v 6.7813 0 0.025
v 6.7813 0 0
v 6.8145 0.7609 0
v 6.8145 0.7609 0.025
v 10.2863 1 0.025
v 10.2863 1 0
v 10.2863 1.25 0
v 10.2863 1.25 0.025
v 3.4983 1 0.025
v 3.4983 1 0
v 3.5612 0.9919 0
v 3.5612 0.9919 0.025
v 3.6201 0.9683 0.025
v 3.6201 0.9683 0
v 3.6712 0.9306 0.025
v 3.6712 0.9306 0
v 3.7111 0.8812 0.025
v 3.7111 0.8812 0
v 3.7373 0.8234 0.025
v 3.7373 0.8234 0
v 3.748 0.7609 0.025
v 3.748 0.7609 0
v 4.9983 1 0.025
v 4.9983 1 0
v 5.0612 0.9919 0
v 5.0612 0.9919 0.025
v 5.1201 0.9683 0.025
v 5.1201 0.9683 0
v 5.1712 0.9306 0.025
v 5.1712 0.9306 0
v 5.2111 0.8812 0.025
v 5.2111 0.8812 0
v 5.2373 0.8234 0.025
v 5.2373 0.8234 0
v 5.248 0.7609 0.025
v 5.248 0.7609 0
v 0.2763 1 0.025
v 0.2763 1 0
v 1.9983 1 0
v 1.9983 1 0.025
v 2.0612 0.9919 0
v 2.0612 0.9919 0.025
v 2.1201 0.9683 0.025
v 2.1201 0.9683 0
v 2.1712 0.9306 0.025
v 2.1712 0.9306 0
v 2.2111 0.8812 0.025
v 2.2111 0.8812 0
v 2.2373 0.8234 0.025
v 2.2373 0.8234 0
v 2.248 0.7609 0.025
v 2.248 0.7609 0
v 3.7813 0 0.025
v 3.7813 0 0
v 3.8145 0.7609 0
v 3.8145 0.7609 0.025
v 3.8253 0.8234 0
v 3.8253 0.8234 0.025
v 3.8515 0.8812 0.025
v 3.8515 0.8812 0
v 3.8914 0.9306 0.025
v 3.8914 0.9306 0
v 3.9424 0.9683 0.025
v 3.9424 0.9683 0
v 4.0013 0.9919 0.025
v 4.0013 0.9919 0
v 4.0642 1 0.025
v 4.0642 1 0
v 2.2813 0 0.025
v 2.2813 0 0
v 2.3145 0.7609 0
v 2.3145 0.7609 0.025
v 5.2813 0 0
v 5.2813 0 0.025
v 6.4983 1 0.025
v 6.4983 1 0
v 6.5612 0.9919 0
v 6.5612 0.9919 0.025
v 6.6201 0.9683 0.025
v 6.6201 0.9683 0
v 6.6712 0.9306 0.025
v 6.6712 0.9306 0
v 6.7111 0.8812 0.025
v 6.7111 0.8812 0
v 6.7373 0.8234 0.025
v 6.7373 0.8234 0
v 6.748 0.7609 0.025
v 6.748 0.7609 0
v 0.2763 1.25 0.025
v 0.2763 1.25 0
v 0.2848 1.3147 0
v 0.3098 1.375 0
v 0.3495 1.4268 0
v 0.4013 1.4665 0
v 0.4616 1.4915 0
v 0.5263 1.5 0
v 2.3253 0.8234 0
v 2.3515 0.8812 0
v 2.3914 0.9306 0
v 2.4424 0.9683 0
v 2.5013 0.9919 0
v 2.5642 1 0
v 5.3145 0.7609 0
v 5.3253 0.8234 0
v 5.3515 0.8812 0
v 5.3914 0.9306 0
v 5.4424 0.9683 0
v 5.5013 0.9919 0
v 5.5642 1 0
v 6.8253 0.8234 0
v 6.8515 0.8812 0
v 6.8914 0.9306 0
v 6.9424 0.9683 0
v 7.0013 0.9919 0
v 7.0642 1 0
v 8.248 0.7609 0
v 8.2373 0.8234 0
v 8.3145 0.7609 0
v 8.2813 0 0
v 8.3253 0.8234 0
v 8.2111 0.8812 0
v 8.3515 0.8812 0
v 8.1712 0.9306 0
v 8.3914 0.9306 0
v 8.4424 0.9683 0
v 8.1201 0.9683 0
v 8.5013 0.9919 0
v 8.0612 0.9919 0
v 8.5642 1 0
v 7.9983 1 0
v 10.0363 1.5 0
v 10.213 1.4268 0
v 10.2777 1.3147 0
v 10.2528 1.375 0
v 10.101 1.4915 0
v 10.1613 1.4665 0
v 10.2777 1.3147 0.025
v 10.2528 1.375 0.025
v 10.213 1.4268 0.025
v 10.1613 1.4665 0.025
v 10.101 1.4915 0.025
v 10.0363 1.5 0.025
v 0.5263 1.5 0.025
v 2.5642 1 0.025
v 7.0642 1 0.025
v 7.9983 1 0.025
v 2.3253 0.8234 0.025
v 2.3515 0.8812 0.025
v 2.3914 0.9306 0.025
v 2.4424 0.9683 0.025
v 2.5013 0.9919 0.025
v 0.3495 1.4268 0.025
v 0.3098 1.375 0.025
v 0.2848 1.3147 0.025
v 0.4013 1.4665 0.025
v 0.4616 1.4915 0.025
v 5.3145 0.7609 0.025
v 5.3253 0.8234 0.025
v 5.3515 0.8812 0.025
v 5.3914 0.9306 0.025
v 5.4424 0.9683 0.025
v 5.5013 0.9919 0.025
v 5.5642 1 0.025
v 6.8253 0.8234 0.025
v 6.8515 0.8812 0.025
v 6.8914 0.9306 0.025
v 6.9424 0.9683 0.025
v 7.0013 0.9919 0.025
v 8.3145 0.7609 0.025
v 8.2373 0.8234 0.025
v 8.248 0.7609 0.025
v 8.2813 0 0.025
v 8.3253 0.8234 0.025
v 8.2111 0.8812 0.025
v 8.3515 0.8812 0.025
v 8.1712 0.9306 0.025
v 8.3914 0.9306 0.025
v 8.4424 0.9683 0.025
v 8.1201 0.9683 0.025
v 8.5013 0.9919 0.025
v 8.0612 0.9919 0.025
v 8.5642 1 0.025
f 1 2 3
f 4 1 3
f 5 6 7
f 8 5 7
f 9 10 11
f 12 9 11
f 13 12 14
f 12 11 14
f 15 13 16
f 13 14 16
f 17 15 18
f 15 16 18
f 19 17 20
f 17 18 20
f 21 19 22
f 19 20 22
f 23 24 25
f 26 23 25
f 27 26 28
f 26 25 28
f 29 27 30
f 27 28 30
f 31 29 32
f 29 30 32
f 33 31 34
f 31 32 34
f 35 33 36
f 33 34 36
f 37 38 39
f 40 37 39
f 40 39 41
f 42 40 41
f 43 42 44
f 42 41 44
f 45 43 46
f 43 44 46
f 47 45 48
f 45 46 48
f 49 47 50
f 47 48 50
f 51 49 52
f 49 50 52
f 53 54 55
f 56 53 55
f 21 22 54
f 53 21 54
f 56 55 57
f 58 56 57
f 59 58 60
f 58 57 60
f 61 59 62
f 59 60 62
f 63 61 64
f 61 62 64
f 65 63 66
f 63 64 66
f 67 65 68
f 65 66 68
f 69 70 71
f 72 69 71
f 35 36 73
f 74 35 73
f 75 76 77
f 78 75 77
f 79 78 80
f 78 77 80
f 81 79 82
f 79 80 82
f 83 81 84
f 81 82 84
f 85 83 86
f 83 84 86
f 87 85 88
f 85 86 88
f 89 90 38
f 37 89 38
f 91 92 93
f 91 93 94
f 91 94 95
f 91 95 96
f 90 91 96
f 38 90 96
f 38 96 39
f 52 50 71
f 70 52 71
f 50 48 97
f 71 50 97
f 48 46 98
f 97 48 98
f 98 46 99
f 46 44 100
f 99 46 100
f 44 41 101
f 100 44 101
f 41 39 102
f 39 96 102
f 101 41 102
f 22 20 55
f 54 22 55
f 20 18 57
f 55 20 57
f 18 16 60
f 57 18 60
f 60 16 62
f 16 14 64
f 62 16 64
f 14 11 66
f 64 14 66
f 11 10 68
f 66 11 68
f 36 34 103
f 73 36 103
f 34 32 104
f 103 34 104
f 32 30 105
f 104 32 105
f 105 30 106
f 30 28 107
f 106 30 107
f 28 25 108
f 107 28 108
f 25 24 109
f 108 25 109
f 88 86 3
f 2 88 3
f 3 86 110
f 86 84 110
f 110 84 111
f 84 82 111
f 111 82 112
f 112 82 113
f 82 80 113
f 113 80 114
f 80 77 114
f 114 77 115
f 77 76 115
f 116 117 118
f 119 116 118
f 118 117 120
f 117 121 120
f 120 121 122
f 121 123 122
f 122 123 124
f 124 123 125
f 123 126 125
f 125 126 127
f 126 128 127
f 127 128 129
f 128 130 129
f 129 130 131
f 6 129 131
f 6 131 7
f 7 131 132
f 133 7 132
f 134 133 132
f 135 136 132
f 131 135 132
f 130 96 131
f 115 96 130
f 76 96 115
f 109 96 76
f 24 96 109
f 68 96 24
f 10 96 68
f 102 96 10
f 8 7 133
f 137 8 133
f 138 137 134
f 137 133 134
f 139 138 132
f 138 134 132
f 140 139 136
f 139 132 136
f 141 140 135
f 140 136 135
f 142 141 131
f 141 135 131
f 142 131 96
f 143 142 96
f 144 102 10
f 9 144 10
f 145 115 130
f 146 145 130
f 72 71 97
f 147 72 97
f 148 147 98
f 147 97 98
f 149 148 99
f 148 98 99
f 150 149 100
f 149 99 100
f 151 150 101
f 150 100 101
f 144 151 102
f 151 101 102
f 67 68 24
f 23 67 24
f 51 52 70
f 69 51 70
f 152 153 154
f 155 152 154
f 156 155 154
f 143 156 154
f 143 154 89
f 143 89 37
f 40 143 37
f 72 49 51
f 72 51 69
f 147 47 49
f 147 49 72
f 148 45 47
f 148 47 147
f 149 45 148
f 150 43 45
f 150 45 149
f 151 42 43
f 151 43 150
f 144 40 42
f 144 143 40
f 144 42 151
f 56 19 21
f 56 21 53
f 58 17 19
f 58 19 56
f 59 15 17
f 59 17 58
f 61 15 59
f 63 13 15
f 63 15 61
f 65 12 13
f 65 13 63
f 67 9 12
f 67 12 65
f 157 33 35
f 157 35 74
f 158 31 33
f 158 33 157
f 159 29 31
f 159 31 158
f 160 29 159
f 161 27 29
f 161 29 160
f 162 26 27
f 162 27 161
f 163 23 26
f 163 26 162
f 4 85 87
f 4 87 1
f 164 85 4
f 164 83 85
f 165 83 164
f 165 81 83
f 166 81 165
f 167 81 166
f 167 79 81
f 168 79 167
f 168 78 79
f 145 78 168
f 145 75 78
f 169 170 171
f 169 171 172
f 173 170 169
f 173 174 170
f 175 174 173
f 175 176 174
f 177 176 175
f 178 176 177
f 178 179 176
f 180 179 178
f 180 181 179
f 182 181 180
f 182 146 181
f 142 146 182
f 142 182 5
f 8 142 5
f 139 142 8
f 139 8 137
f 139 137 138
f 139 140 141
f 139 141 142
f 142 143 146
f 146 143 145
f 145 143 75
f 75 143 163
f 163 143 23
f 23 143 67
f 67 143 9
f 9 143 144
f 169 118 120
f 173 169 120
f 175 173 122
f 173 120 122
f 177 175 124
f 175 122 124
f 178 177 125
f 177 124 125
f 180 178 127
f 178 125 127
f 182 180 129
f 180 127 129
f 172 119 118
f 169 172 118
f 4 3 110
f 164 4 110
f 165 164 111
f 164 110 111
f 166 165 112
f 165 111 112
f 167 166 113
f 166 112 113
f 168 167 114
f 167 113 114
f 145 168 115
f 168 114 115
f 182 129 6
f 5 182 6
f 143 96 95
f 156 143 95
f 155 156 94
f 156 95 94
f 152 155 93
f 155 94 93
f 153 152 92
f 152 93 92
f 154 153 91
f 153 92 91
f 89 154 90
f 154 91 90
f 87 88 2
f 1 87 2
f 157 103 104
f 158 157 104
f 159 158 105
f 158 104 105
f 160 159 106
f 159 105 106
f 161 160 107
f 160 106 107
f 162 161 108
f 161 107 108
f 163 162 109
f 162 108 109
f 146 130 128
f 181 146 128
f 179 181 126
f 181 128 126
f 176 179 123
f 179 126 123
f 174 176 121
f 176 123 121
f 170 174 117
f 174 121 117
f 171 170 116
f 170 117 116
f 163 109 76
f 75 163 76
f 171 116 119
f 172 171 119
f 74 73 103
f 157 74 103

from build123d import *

# Parameters (mm, degrees)
BOSS_EXTRUDE1_DEPTH = 0.025


with BuildPart() as part:
    # Model → Boss-Extrude1 (new body)
    with BuildSketch(Plane.XY):
        with BuildLine():
            Line((8.5975, 1.5), (1.9475, 1.5))
            Line((1.9475, 1.5), (0.526264761, 1.5))
            ThreePointArc((0.526264761, 1.5), (0.349488066, 1.426776695), (0.276264761, 1.25))
            Line((0.276264761, 1.25), (0.276264761, 1))
            Line((0.276264761, 1), (0.706264761, 1))
            Line((0.706264761, 1), (1.248280883, 1))
            Line((1.248280883, 1), (1.998280883, 1))
            ThreePointArc((1.998280883, 1), (2.171159147, 0.930590991), (2.248042938, 0.760904847))
            Line((2.248042938, 0.760904847), (2.281264761, 0))
            Line((2.281264761, 0), (2.314486584, 0.760904847))
            ThreePointArc((2.314486584, 0.760904847), (2.391370376, 0.930590991), (2.56424864, 1))
            Line((2.56424864, 1), (3.498280883, 1))
            ThreePointArc((3.498280883, 1), (3.671159147, 0.930590991), (3.748042938, 0.760904847))
            Line((3.748042938, 0.760904847), (3.781264761, 0))
            Line((3.781264761, 0), (3.814486584, 0.760904847))
            ThreePointArc((3.814486584, 0.760904847), (3.891370376, 0.930590991), (4.06424864, 1))
            Line((4.06424864, 1), (4.998280883, 1))
            ThreePointArc((4.998280883, 1), (5.171159147, 0.930590991), (5.248042938, 0.760904847))
            Line((5.248042938, 0.760904847), (5.281264761, 0))
            Line((5.281264761, 0), (5.314486584, 0.760904847))
            ThreePointArc((5.314486584, 0.760904847), (5.391370376, 0.930590991), (5.56424864, 1))
            Line((5.56424864, 1), (6.498280883, 1))
            ThreePointArc((6.498280883, 1), (6.671159147, 0.930590991), (6.748042938, 0.760904847))
            Line((6.748042938, 0.760904847), (6.781264761, 0))
            Line((6.781264761, 0), (6.814486584, 0.760904847))
            ThreePointArc((6.814486584, 0.760904847), (6.891370376, 0.930590991), (7.06424864, 1))
            Line((7.06424864, 1), (7.998280883, 1))
            ThreePointArc((7.998280883, 1), (8.171159147, 0.930590991), (8.248042938, 0.760904847))
            Line((8.248042938, 0.760904847), (8.281264761, 0))
            Line((8.281264761, 0), (8.314486584, 0.760904847))
            ThreePointArc((8.314486584, 0.760904847), (8.391370376, 0.930590991), (8.56424864, 1))
            Line((8.56424864, 1), (9.31424864, 1))
            Line((9.31424864, 1), (9.856264761, 1))
            Line((9.856264761, 1), (10.286264761, 1))
            Line((10.286264761, 1), (10.286264761, 1.25))
            ThreePointArc((10.286264761, 1.25), (10.213041457, 1.426776695), (10.036264761, 1.5))
            Line((10.036264761, 1.5), (8.5975, 1.5))
        make_face()
    extrude(amount=BOSS_EXTRUDE1_DEPTH)


solid = part.part
